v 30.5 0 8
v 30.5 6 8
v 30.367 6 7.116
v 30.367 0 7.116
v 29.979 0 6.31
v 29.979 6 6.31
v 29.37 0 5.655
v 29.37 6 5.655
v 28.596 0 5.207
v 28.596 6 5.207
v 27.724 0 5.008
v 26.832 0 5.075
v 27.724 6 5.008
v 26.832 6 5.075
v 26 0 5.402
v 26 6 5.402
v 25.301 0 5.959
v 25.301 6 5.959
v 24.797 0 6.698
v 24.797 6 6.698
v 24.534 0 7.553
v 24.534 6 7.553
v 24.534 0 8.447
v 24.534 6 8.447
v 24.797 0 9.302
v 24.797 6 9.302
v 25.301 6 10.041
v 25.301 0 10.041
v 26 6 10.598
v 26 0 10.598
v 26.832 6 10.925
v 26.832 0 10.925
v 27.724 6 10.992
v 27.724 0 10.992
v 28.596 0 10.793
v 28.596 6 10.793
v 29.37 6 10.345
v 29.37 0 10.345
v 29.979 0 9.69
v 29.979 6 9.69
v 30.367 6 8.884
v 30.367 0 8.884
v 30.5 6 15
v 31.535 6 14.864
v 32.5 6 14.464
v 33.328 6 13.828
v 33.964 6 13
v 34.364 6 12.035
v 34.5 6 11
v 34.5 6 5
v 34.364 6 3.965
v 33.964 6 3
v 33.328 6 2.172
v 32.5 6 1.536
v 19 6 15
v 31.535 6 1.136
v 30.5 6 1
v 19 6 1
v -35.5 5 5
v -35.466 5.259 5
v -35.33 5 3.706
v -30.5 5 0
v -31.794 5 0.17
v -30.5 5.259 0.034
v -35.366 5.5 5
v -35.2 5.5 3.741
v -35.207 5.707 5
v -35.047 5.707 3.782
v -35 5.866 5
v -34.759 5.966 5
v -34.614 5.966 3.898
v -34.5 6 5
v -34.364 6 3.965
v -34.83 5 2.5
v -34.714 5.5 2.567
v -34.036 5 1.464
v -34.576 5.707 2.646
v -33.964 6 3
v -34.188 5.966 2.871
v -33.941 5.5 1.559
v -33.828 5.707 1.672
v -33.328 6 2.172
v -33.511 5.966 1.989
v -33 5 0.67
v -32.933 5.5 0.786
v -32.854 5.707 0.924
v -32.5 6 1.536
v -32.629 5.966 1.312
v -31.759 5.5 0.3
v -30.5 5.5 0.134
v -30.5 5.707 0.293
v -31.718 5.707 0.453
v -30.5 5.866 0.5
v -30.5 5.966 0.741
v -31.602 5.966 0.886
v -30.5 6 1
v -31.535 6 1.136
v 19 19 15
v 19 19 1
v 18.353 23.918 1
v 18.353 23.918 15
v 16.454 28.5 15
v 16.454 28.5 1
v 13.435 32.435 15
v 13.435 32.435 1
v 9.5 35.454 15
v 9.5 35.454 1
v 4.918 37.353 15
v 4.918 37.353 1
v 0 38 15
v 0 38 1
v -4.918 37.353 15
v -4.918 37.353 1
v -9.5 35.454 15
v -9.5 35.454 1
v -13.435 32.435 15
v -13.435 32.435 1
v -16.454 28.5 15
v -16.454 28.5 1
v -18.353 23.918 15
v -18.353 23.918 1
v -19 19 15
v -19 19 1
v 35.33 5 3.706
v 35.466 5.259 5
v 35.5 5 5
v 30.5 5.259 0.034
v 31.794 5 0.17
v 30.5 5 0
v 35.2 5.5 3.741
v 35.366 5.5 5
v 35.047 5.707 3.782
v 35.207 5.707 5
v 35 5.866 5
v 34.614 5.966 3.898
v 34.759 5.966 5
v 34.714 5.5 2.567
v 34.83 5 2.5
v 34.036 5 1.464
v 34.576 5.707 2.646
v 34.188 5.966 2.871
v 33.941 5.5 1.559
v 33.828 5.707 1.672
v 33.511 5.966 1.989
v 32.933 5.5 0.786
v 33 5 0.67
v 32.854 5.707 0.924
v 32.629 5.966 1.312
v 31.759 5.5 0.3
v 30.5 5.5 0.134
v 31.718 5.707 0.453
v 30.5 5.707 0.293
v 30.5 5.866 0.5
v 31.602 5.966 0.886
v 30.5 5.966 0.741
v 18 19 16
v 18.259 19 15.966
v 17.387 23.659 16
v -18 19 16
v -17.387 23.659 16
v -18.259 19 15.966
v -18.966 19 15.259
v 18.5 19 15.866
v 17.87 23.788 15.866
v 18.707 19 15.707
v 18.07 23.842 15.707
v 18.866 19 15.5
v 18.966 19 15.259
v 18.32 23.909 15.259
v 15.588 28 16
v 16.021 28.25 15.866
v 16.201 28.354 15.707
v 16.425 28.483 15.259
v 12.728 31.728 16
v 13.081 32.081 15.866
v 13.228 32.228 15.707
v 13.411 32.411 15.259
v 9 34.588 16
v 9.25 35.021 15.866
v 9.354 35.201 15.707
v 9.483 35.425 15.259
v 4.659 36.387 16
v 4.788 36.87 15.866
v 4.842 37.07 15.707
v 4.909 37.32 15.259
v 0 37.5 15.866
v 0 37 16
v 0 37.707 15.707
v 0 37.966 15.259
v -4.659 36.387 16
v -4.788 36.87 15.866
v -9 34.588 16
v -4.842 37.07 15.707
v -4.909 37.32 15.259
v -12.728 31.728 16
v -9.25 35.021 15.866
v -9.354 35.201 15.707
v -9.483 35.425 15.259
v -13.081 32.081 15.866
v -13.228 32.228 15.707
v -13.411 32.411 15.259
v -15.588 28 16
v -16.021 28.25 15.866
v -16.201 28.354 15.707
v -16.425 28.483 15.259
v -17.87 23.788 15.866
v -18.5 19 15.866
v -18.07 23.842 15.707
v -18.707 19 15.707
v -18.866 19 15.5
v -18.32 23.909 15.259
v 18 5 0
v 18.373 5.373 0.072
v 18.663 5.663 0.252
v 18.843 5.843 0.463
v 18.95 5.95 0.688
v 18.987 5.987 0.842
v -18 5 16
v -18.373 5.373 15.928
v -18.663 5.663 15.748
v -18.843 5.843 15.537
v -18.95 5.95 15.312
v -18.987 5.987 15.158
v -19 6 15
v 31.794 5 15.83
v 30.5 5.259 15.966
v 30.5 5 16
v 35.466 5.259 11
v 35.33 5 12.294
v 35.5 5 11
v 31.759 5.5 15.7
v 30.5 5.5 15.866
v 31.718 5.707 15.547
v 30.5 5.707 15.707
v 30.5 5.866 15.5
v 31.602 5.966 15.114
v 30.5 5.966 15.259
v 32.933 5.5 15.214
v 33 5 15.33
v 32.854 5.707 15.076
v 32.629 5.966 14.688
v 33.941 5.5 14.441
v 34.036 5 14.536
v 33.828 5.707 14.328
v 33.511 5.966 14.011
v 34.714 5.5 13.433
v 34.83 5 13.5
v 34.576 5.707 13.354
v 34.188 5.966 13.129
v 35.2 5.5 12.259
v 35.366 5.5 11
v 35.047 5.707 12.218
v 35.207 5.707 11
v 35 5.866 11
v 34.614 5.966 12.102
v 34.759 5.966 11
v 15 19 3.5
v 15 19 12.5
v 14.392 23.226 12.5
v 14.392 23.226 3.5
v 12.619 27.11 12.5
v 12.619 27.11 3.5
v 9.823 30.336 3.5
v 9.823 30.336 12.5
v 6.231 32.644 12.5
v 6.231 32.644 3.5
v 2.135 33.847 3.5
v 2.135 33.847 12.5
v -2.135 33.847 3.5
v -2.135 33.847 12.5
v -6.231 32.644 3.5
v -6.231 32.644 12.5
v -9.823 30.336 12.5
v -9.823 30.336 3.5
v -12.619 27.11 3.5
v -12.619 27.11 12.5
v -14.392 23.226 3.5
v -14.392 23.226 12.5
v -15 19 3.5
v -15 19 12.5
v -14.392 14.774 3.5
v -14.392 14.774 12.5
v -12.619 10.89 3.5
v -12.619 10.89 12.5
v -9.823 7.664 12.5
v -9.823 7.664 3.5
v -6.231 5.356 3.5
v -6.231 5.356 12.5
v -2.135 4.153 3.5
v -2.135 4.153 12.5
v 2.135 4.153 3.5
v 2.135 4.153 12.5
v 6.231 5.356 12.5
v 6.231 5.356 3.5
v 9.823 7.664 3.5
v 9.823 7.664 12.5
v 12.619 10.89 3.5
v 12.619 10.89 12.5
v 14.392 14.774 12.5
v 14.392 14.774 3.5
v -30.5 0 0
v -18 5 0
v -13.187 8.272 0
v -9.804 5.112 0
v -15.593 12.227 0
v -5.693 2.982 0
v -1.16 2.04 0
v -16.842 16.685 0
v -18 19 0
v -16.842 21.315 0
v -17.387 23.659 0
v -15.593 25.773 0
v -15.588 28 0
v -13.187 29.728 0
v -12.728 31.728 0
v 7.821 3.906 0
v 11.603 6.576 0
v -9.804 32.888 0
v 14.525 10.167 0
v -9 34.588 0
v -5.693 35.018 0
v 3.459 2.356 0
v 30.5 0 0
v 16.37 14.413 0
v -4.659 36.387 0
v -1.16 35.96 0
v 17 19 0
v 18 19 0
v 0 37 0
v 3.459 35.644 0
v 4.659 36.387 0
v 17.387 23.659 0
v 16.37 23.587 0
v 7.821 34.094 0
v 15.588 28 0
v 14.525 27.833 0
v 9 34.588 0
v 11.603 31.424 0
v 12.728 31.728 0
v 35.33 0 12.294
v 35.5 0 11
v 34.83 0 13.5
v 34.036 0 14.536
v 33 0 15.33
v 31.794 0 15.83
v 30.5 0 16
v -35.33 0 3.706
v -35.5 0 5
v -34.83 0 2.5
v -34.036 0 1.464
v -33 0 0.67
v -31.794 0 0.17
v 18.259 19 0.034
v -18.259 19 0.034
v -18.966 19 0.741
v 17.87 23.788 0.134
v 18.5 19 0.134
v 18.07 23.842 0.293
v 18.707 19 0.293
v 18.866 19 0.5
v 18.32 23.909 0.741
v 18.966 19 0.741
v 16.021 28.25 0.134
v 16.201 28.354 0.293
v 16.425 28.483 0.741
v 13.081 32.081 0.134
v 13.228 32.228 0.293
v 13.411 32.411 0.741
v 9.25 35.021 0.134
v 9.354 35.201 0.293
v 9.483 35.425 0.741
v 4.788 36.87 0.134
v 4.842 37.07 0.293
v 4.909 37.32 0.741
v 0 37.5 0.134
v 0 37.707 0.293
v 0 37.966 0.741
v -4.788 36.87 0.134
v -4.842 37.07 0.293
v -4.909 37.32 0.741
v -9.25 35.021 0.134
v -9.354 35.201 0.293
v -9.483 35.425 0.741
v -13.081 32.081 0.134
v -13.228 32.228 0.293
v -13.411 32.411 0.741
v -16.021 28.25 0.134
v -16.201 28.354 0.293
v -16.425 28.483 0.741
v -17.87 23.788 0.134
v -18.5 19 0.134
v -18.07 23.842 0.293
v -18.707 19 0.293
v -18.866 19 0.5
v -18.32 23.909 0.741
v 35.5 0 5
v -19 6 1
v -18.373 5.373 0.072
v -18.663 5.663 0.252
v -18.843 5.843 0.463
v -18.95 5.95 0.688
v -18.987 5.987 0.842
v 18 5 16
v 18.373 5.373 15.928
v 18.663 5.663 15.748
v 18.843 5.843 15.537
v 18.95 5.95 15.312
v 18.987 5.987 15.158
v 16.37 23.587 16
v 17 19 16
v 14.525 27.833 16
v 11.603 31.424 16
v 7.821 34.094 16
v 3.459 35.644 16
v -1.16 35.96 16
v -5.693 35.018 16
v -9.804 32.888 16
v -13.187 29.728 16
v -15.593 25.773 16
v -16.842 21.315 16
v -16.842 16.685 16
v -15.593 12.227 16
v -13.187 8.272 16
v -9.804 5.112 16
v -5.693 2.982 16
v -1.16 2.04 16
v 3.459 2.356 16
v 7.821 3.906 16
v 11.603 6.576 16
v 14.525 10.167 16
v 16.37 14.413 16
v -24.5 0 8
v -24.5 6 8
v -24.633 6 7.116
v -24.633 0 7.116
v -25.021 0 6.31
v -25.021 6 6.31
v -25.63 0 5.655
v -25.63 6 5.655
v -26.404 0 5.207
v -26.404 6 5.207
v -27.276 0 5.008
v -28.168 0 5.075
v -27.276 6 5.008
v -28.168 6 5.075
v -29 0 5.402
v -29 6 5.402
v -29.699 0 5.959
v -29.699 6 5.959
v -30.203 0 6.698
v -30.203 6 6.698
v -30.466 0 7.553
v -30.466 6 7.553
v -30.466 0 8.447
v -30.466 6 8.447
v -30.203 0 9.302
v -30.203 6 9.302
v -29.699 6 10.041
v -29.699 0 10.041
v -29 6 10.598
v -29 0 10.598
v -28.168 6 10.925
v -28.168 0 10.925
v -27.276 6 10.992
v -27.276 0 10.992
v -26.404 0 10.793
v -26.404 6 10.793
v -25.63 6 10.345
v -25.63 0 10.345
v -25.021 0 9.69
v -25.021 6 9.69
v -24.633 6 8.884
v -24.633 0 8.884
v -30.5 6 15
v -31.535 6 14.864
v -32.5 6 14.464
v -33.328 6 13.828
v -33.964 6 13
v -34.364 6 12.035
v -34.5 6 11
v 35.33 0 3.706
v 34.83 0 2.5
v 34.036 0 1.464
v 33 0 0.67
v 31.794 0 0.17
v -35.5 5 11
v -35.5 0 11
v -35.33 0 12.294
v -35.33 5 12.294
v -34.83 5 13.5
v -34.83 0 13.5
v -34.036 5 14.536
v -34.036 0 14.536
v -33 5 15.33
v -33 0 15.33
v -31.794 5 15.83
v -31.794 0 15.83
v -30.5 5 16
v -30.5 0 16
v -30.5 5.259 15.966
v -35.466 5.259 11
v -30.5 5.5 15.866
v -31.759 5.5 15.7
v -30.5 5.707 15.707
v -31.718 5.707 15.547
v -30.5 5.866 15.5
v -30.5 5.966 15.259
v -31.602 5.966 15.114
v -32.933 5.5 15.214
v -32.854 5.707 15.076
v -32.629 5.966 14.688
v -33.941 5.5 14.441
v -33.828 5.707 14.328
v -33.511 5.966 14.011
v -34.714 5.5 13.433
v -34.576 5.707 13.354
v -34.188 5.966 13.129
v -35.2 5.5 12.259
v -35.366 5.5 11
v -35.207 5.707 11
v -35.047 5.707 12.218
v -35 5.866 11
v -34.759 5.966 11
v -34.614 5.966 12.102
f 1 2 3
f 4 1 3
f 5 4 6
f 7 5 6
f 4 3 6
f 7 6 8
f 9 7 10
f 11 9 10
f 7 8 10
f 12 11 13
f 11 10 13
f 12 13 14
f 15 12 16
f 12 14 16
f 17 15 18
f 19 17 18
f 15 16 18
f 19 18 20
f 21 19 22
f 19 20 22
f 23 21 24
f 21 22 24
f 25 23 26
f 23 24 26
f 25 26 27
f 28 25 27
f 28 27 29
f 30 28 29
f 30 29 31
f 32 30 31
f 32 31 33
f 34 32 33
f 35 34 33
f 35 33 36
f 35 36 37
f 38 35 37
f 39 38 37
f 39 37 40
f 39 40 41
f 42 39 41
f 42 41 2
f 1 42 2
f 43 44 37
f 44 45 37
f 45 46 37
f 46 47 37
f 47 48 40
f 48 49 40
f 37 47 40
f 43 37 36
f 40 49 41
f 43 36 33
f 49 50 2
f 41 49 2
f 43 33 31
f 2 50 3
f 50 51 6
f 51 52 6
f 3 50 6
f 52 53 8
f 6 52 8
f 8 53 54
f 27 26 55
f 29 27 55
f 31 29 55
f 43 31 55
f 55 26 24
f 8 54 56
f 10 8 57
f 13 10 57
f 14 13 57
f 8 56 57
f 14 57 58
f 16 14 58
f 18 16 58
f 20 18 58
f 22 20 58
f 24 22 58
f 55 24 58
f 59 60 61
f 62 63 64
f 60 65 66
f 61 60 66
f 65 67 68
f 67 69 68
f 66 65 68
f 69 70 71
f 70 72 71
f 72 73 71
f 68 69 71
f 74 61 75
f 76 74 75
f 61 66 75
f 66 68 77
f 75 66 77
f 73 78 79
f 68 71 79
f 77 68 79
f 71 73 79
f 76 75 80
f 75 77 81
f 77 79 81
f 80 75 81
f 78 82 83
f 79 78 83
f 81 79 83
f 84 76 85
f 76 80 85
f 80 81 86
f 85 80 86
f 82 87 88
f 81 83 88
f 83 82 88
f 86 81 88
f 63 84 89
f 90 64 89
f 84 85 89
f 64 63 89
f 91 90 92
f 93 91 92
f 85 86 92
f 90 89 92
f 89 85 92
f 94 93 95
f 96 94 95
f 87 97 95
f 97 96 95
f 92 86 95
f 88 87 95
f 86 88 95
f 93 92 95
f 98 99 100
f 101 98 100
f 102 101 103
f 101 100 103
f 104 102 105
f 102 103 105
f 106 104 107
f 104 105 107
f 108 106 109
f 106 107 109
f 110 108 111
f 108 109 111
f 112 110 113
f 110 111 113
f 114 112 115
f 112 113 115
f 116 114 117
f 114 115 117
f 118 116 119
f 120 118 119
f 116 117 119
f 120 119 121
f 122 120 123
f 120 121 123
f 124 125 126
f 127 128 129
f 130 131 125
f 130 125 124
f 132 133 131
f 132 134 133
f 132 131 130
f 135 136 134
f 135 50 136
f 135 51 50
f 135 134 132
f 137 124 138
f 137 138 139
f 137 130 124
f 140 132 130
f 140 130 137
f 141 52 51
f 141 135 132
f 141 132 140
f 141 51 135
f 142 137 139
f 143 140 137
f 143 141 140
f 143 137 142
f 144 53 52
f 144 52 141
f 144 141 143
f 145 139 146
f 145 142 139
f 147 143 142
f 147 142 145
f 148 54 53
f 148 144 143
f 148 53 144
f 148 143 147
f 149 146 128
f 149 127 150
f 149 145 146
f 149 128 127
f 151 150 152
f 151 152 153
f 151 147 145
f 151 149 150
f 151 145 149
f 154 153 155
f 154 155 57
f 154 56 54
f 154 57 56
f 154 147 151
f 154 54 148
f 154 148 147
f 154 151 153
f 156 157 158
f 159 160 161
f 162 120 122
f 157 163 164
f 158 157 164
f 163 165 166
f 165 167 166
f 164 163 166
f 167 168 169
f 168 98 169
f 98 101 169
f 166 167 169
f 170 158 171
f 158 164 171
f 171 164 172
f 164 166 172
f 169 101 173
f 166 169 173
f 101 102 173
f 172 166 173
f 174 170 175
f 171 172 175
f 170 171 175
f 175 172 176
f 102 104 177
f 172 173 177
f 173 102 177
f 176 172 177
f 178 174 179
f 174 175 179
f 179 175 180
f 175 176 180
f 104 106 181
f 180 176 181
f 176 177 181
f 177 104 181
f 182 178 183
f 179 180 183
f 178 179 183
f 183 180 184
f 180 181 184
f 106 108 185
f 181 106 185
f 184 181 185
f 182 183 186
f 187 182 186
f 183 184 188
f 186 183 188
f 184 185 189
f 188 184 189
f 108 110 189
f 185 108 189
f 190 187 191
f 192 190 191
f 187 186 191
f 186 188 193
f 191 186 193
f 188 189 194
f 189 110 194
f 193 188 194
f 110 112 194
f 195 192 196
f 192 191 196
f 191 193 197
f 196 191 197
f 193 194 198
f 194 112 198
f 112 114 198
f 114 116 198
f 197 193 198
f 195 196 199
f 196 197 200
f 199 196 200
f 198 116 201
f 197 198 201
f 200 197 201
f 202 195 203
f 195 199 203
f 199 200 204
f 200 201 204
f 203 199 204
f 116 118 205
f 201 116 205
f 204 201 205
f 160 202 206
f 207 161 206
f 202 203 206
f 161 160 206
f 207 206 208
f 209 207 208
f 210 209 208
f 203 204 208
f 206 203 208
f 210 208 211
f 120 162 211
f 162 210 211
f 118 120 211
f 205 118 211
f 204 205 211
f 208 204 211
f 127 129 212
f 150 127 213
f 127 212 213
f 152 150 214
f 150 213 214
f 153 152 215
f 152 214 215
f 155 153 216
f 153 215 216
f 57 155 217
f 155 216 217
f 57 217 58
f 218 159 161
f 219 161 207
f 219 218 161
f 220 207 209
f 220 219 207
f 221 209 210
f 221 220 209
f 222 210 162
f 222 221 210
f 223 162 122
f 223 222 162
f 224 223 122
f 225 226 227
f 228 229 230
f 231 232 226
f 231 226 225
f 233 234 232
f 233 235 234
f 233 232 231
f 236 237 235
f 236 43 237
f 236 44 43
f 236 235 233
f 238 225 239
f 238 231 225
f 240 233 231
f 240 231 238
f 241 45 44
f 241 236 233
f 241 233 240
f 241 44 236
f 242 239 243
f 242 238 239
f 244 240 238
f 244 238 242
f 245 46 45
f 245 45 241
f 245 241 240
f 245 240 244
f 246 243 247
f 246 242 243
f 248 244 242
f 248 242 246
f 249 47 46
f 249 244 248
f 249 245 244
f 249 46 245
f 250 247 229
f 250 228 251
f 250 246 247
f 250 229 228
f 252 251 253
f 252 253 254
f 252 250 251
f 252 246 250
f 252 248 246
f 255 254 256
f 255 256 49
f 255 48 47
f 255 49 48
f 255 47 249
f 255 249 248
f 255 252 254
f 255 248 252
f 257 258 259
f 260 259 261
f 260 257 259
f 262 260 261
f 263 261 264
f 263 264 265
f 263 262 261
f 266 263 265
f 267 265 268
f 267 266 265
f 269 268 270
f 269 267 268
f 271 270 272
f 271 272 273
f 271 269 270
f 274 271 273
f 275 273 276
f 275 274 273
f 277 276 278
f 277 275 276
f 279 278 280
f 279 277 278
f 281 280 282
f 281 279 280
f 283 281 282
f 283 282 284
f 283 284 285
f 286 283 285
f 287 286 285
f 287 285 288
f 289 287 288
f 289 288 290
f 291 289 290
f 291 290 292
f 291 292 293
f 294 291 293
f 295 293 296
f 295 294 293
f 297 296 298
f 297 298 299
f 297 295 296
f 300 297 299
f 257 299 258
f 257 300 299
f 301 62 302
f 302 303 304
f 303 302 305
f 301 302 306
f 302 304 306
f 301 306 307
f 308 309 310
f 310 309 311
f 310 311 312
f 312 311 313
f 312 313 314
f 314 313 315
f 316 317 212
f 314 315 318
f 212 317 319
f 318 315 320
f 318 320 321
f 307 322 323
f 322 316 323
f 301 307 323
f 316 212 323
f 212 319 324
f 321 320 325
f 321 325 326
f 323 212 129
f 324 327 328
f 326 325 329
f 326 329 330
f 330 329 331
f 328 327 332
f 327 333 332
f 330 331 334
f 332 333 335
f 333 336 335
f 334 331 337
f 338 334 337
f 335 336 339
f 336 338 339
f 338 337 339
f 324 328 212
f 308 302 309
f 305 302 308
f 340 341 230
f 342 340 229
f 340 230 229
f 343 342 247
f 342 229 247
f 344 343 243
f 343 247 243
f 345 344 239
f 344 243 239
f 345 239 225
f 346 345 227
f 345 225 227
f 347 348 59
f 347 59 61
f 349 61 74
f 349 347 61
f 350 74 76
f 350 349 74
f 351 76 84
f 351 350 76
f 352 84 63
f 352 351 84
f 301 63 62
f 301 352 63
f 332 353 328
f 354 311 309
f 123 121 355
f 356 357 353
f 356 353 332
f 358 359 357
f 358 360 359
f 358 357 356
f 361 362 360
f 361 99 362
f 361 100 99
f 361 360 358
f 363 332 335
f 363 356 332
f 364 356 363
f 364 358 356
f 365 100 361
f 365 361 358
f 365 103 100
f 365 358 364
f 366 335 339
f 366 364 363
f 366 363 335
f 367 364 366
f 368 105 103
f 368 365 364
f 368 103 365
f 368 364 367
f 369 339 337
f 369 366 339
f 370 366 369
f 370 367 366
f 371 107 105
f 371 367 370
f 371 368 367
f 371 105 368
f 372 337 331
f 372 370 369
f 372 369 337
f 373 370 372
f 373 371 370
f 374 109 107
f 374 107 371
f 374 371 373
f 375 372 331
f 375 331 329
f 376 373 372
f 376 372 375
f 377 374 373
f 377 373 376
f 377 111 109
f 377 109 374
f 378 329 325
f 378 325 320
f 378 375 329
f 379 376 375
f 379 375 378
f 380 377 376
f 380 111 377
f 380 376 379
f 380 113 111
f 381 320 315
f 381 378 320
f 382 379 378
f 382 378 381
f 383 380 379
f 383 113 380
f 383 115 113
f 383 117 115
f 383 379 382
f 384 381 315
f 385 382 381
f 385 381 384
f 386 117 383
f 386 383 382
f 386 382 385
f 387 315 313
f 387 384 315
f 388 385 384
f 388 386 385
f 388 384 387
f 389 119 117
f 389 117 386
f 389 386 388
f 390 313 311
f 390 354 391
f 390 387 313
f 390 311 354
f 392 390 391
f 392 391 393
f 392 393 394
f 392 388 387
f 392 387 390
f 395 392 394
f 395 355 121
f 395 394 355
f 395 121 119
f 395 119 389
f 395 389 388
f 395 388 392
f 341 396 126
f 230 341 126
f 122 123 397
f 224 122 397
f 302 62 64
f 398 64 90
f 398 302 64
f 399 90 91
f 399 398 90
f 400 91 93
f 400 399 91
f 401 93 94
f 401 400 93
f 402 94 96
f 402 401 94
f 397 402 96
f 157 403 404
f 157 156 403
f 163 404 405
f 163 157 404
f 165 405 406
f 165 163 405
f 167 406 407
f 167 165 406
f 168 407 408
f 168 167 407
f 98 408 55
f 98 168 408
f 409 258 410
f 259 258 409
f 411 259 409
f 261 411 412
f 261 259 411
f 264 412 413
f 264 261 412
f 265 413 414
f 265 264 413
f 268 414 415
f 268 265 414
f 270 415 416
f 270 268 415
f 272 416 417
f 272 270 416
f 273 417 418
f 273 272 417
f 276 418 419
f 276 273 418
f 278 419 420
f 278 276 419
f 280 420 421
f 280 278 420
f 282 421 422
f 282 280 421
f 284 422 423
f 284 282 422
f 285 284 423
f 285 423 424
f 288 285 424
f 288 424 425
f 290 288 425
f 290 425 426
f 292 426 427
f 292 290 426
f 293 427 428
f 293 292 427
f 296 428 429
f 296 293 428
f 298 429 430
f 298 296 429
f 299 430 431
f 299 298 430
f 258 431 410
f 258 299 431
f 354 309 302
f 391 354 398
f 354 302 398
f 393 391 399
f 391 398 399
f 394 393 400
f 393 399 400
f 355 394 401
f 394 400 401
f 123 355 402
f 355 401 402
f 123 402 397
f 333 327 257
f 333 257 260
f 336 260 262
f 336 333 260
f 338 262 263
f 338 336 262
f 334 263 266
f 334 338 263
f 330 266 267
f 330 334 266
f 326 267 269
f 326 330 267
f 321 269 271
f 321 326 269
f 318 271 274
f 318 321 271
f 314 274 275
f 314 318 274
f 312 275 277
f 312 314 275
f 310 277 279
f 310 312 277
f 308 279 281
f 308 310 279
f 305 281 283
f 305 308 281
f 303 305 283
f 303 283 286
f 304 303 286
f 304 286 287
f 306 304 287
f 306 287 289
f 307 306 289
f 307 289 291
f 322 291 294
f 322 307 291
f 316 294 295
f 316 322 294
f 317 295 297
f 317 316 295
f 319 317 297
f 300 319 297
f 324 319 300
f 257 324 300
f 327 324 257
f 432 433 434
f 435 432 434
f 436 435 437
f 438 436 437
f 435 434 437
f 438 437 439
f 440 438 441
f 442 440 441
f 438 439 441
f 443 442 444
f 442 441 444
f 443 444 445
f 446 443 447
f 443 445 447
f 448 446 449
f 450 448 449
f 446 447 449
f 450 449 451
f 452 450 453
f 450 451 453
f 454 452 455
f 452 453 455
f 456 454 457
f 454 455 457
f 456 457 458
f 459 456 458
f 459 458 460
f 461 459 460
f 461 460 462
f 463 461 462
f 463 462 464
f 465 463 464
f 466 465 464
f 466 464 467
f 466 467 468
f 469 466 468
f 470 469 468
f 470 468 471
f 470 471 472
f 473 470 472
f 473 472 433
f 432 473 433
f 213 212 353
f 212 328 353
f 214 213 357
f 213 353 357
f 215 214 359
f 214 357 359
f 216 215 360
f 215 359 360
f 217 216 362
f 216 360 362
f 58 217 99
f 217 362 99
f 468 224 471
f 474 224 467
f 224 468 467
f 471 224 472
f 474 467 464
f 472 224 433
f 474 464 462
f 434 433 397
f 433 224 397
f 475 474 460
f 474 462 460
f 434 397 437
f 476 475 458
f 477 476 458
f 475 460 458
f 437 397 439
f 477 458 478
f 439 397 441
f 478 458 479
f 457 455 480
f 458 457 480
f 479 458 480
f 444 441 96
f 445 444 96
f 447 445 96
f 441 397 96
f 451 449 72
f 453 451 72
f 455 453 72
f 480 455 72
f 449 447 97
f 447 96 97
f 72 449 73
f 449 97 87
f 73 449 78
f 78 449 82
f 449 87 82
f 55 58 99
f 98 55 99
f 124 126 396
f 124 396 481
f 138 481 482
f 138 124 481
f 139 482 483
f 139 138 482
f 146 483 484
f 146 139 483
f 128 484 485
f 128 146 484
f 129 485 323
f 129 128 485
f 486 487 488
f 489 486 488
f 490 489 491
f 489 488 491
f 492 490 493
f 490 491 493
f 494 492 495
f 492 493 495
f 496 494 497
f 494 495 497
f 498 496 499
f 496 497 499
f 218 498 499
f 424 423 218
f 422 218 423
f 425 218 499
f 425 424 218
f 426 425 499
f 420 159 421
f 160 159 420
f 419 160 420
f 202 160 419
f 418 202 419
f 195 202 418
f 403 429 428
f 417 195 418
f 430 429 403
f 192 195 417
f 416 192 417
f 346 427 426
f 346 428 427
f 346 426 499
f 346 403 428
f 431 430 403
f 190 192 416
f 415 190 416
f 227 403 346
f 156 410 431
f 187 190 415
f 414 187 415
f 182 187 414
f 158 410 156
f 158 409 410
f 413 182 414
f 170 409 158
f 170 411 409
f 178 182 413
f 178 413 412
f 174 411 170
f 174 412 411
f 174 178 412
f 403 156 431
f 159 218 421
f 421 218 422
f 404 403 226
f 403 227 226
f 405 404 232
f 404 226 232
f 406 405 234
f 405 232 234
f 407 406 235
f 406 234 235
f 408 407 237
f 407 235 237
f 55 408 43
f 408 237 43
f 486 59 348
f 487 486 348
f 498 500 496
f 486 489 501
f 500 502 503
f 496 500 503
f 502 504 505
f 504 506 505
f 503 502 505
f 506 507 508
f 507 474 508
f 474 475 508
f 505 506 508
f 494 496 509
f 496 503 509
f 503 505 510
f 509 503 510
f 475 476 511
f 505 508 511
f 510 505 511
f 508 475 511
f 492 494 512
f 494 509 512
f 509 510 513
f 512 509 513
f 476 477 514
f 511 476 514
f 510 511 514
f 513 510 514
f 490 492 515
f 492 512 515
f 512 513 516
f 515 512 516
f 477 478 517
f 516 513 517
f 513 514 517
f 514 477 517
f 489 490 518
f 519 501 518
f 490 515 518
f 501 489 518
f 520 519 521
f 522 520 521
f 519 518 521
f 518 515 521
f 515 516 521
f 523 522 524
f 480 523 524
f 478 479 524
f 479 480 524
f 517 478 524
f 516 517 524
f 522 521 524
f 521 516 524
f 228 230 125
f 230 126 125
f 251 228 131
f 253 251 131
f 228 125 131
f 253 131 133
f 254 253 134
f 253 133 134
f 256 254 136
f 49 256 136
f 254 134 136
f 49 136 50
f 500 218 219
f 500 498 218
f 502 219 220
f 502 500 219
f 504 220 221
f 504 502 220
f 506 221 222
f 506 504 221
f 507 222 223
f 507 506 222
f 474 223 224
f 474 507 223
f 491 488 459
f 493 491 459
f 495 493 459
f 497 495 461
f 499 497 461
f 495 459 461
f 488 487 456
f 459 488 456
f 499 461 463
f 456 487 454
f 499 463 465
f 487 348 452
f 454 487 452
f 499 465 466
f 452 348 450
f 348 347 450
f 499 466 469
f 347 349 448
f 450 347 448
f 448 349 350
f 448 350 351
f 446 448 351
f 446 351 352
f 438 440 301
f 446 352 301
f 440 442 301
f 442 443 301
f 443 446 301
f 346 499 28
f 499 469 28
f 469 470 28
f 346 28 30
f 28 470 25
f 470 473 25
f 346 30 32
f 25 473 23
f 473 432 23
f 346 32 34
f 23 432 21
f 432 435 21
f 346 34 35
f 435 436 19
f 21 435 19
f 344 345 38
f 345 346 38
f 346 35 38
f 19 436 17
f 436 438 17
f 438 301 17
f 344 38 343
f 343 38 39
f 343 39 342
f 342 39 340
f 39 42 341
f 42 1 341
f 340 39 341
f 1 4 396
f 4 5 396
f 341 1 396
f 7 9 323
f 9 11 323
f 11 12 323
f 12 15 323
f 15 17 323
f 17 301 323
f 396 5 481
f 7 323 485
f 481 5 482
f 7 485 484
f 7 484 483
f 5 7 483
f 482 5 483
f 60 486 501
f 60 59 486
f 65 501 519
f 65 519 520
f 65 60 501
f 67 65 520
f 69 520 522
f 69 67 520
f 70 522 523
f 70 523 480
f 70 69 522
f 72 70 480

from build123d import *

# Parameters (mm, degrees)
SKETCH1_R               = 15
BOSS_EXTRUDE1_DEPTH     = 16
FILLET1_R               = 5
SKETCH2_R               = 3
CUT_EXTRUDE1_DEPTH      = 33
CUT_EXTRUDE1_DEPTH_BACK = 7
CHAMFER1_SIZE           = 2
CHAMFER1_SIZE2          = 3.5
CHAMFER2_SIZE           = 3.5
CHAMFER2_SIZE2          = 2
FILLET2_R               = 1


with BuildPart() as part:
    # Sketch1 → Boss-Extrude1 (new body)
    with BuildSketch(Plane.XY):
        with BuildLine():
            Line((-35.5, 0), (35.5, 0))
            Line((35.5, 0), (35.5, 6))
            Line((35.5, 6), (19, 6))
            Line((19, 6), (19, 19))
            ThreePointArc((19, 19), (0, 38), (-19, 19))
            Line((-19, 19), (-19, 6))
            Line((-19, 6), (-35.5, 6))
            Line((-35.5, 6), (-35.5, 0))
        make_face()
        with Locations((0, 19)):
            Circle(SKETCH1_R, mode=Mode.SUBTRACT)
    extrude(amount=BOSS_EXTRUDE1_DEPTH)

    # Fillet1
    fillet1_edges = [part.edges().sort_by_distance(p)[0] for p in [
        (35.5, 3, 0),
        (-35.5, 3, 16),
        (35.5, 3, 16),
        (-35.5, 3, 0),
    ]]
    fillet(fillet1_edges, radius=FILLET1_R)

    # Sketch2 → Cut-Extrude1 (cut, two sides)
    with BuildSketch(Plane(origin=(0, 6, 0), x_dir=(1, 0, 0), z_dir=(0, 1, 0))) as cut_extrude1_sk:
        with Locations((-27.5, -8)):
            Circle(SKETCH2_R)
        with Locations((27.5, -8)):
            Circle(SKETCH2_R)
    extrude(amount=CUT_EXTRUDE1_DEPTH, mode=Mode.SUBTRACT)
    extrude(cut_extrude1_sk.sketch, amount=-CUT_EXTRUDE1_DEPTH_BACK, mode=Mode.SUBTRACT)

    # Chamfer1
    chamfer1_edges = [part.edges().sort_by_distance(p)[0] for p in [
        (-15, 19, 16),
    ]]
    chamfer1_side = [part.faces().sort_by_distance(p)[0] for p in [
        (0, 0.718679344, 16),
    ]]
    chamfer(chamfer1_edges, length=CHAMFER1_SIZE, length2=CHAMFER1_SIZE2, reference=chamfer1_side[0])

    # Chamfer2
    chamfer2_edges = [part.edges().sort_by_distance(p)[0] for p in [
        (-15, 19, 0),
    ]]
    chamfer2_side = [part.faces().sort_by_distance(p)[0] for p in [
        (-15, 19, 6.25),
    ]]
    chamfer(chamfer2_edges, length=CHAMFER2_SIZE, length2=CHAMFER2_SIZE2, reference=chamfer2_side[0])

    # Fillet2
    fillet2_edges = [part.edges().sort_by_distance(p)[0] for p in [
        (0, 38, 0),
        (19, 12.5, 0),
        (19, 12.5, 16),
        (0, 38, 16),
        (-19, 12.5, 16),
        (-24.75, 6, 16),
        (-35.5, 6, 8),
        (24.75, 6, 0),
        (-34.035533906, 6, 14.535533906),
        (-34.035533906, 6, 1.464466094),
        (24.75, 6, 16),
        (35.5, 6, 8),
        (34.035533906, 6, 14.535533906),
        (34.035533906, 6, 1.464466094),
        (-24.75, 6, 0),
        (-19, 12.5, 0),
    ]]
    fillet(fillet2_edges, radius=FILLET2_R)


solid = part.part
